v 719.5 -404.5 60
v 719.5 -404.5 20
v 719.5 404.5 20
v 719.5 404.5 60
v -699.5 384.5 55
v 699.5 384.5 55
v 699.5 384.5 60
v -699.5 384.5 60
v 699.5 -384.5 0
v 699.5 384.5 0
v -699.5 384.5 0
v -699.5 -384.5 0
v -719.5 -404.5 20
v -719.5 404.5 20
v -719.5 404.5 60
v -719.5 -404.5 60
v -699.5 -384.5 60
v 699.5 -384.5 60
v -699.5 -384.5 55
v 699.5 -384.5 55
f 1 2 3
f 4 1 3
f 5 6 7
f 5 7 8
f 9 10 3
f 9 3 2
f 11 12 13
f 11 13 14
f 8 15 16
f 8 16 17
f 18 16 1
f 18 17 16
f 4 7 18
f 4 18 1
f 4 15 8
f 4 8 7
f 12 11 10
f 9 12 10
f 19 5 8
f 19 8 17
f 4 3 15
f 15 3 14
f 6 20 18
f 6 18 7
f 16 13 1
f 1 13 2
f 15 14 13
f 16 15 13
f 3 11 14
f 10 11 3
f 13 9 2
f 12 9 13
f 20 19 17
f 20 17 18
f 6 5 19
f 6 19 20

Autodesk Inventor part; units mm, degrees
ref_plane "YZ Plane" through (0, 0, 0) normal (1, 0, 0) x (0, 1, 0)
ref_plane "XZ Plane" through (0, 0, 0) normal (0, 1, 0) x (-1, 0, 0)
ref_plane "XY Plane" through (0, 0, 0) normal (0, 0, 1) x (1, 0, 0)
sketch "Sketch1" plane through (0, 0, 0) normal (0, 0, 1) x (1, 0, 0)
  line L0 (-719.5, -404.5) -> (719.5, -404.5)
  line L1 (719.5, -404.5) -> (719.5, 404.5)
  line L2 (719.5, 404.5) -> (-719.5, 404.5)
  line L3 (-719.5, 404.5) -> (-719.5, -404.5)
  line L4 (-719.5, -404.5) -> (719.5, 404.5) construction
  line L5 (719.5, -404.5) -> (-719.5, 404.5) construction
  point P0 (0, 0)
  dimension "d0" = 1439
  dimension "d1" = 809
extrude "Extrusion1" add sketch "Sketch1" along normal blind 60
shell "Shell1" thickness 20 removed faces 1 at (-239.8333, 134.8333, 60) ; own thickness 55 on faces at (-239.8333, 134.8333, 0)
chamfer "Chamfer1" distance 20 angle 45 4 edges at (719.5, 0, 0) (0, 404.5, 0) (-719.5, 0, 0) (0, -404.5, 0)
properties part number "TV 65"
